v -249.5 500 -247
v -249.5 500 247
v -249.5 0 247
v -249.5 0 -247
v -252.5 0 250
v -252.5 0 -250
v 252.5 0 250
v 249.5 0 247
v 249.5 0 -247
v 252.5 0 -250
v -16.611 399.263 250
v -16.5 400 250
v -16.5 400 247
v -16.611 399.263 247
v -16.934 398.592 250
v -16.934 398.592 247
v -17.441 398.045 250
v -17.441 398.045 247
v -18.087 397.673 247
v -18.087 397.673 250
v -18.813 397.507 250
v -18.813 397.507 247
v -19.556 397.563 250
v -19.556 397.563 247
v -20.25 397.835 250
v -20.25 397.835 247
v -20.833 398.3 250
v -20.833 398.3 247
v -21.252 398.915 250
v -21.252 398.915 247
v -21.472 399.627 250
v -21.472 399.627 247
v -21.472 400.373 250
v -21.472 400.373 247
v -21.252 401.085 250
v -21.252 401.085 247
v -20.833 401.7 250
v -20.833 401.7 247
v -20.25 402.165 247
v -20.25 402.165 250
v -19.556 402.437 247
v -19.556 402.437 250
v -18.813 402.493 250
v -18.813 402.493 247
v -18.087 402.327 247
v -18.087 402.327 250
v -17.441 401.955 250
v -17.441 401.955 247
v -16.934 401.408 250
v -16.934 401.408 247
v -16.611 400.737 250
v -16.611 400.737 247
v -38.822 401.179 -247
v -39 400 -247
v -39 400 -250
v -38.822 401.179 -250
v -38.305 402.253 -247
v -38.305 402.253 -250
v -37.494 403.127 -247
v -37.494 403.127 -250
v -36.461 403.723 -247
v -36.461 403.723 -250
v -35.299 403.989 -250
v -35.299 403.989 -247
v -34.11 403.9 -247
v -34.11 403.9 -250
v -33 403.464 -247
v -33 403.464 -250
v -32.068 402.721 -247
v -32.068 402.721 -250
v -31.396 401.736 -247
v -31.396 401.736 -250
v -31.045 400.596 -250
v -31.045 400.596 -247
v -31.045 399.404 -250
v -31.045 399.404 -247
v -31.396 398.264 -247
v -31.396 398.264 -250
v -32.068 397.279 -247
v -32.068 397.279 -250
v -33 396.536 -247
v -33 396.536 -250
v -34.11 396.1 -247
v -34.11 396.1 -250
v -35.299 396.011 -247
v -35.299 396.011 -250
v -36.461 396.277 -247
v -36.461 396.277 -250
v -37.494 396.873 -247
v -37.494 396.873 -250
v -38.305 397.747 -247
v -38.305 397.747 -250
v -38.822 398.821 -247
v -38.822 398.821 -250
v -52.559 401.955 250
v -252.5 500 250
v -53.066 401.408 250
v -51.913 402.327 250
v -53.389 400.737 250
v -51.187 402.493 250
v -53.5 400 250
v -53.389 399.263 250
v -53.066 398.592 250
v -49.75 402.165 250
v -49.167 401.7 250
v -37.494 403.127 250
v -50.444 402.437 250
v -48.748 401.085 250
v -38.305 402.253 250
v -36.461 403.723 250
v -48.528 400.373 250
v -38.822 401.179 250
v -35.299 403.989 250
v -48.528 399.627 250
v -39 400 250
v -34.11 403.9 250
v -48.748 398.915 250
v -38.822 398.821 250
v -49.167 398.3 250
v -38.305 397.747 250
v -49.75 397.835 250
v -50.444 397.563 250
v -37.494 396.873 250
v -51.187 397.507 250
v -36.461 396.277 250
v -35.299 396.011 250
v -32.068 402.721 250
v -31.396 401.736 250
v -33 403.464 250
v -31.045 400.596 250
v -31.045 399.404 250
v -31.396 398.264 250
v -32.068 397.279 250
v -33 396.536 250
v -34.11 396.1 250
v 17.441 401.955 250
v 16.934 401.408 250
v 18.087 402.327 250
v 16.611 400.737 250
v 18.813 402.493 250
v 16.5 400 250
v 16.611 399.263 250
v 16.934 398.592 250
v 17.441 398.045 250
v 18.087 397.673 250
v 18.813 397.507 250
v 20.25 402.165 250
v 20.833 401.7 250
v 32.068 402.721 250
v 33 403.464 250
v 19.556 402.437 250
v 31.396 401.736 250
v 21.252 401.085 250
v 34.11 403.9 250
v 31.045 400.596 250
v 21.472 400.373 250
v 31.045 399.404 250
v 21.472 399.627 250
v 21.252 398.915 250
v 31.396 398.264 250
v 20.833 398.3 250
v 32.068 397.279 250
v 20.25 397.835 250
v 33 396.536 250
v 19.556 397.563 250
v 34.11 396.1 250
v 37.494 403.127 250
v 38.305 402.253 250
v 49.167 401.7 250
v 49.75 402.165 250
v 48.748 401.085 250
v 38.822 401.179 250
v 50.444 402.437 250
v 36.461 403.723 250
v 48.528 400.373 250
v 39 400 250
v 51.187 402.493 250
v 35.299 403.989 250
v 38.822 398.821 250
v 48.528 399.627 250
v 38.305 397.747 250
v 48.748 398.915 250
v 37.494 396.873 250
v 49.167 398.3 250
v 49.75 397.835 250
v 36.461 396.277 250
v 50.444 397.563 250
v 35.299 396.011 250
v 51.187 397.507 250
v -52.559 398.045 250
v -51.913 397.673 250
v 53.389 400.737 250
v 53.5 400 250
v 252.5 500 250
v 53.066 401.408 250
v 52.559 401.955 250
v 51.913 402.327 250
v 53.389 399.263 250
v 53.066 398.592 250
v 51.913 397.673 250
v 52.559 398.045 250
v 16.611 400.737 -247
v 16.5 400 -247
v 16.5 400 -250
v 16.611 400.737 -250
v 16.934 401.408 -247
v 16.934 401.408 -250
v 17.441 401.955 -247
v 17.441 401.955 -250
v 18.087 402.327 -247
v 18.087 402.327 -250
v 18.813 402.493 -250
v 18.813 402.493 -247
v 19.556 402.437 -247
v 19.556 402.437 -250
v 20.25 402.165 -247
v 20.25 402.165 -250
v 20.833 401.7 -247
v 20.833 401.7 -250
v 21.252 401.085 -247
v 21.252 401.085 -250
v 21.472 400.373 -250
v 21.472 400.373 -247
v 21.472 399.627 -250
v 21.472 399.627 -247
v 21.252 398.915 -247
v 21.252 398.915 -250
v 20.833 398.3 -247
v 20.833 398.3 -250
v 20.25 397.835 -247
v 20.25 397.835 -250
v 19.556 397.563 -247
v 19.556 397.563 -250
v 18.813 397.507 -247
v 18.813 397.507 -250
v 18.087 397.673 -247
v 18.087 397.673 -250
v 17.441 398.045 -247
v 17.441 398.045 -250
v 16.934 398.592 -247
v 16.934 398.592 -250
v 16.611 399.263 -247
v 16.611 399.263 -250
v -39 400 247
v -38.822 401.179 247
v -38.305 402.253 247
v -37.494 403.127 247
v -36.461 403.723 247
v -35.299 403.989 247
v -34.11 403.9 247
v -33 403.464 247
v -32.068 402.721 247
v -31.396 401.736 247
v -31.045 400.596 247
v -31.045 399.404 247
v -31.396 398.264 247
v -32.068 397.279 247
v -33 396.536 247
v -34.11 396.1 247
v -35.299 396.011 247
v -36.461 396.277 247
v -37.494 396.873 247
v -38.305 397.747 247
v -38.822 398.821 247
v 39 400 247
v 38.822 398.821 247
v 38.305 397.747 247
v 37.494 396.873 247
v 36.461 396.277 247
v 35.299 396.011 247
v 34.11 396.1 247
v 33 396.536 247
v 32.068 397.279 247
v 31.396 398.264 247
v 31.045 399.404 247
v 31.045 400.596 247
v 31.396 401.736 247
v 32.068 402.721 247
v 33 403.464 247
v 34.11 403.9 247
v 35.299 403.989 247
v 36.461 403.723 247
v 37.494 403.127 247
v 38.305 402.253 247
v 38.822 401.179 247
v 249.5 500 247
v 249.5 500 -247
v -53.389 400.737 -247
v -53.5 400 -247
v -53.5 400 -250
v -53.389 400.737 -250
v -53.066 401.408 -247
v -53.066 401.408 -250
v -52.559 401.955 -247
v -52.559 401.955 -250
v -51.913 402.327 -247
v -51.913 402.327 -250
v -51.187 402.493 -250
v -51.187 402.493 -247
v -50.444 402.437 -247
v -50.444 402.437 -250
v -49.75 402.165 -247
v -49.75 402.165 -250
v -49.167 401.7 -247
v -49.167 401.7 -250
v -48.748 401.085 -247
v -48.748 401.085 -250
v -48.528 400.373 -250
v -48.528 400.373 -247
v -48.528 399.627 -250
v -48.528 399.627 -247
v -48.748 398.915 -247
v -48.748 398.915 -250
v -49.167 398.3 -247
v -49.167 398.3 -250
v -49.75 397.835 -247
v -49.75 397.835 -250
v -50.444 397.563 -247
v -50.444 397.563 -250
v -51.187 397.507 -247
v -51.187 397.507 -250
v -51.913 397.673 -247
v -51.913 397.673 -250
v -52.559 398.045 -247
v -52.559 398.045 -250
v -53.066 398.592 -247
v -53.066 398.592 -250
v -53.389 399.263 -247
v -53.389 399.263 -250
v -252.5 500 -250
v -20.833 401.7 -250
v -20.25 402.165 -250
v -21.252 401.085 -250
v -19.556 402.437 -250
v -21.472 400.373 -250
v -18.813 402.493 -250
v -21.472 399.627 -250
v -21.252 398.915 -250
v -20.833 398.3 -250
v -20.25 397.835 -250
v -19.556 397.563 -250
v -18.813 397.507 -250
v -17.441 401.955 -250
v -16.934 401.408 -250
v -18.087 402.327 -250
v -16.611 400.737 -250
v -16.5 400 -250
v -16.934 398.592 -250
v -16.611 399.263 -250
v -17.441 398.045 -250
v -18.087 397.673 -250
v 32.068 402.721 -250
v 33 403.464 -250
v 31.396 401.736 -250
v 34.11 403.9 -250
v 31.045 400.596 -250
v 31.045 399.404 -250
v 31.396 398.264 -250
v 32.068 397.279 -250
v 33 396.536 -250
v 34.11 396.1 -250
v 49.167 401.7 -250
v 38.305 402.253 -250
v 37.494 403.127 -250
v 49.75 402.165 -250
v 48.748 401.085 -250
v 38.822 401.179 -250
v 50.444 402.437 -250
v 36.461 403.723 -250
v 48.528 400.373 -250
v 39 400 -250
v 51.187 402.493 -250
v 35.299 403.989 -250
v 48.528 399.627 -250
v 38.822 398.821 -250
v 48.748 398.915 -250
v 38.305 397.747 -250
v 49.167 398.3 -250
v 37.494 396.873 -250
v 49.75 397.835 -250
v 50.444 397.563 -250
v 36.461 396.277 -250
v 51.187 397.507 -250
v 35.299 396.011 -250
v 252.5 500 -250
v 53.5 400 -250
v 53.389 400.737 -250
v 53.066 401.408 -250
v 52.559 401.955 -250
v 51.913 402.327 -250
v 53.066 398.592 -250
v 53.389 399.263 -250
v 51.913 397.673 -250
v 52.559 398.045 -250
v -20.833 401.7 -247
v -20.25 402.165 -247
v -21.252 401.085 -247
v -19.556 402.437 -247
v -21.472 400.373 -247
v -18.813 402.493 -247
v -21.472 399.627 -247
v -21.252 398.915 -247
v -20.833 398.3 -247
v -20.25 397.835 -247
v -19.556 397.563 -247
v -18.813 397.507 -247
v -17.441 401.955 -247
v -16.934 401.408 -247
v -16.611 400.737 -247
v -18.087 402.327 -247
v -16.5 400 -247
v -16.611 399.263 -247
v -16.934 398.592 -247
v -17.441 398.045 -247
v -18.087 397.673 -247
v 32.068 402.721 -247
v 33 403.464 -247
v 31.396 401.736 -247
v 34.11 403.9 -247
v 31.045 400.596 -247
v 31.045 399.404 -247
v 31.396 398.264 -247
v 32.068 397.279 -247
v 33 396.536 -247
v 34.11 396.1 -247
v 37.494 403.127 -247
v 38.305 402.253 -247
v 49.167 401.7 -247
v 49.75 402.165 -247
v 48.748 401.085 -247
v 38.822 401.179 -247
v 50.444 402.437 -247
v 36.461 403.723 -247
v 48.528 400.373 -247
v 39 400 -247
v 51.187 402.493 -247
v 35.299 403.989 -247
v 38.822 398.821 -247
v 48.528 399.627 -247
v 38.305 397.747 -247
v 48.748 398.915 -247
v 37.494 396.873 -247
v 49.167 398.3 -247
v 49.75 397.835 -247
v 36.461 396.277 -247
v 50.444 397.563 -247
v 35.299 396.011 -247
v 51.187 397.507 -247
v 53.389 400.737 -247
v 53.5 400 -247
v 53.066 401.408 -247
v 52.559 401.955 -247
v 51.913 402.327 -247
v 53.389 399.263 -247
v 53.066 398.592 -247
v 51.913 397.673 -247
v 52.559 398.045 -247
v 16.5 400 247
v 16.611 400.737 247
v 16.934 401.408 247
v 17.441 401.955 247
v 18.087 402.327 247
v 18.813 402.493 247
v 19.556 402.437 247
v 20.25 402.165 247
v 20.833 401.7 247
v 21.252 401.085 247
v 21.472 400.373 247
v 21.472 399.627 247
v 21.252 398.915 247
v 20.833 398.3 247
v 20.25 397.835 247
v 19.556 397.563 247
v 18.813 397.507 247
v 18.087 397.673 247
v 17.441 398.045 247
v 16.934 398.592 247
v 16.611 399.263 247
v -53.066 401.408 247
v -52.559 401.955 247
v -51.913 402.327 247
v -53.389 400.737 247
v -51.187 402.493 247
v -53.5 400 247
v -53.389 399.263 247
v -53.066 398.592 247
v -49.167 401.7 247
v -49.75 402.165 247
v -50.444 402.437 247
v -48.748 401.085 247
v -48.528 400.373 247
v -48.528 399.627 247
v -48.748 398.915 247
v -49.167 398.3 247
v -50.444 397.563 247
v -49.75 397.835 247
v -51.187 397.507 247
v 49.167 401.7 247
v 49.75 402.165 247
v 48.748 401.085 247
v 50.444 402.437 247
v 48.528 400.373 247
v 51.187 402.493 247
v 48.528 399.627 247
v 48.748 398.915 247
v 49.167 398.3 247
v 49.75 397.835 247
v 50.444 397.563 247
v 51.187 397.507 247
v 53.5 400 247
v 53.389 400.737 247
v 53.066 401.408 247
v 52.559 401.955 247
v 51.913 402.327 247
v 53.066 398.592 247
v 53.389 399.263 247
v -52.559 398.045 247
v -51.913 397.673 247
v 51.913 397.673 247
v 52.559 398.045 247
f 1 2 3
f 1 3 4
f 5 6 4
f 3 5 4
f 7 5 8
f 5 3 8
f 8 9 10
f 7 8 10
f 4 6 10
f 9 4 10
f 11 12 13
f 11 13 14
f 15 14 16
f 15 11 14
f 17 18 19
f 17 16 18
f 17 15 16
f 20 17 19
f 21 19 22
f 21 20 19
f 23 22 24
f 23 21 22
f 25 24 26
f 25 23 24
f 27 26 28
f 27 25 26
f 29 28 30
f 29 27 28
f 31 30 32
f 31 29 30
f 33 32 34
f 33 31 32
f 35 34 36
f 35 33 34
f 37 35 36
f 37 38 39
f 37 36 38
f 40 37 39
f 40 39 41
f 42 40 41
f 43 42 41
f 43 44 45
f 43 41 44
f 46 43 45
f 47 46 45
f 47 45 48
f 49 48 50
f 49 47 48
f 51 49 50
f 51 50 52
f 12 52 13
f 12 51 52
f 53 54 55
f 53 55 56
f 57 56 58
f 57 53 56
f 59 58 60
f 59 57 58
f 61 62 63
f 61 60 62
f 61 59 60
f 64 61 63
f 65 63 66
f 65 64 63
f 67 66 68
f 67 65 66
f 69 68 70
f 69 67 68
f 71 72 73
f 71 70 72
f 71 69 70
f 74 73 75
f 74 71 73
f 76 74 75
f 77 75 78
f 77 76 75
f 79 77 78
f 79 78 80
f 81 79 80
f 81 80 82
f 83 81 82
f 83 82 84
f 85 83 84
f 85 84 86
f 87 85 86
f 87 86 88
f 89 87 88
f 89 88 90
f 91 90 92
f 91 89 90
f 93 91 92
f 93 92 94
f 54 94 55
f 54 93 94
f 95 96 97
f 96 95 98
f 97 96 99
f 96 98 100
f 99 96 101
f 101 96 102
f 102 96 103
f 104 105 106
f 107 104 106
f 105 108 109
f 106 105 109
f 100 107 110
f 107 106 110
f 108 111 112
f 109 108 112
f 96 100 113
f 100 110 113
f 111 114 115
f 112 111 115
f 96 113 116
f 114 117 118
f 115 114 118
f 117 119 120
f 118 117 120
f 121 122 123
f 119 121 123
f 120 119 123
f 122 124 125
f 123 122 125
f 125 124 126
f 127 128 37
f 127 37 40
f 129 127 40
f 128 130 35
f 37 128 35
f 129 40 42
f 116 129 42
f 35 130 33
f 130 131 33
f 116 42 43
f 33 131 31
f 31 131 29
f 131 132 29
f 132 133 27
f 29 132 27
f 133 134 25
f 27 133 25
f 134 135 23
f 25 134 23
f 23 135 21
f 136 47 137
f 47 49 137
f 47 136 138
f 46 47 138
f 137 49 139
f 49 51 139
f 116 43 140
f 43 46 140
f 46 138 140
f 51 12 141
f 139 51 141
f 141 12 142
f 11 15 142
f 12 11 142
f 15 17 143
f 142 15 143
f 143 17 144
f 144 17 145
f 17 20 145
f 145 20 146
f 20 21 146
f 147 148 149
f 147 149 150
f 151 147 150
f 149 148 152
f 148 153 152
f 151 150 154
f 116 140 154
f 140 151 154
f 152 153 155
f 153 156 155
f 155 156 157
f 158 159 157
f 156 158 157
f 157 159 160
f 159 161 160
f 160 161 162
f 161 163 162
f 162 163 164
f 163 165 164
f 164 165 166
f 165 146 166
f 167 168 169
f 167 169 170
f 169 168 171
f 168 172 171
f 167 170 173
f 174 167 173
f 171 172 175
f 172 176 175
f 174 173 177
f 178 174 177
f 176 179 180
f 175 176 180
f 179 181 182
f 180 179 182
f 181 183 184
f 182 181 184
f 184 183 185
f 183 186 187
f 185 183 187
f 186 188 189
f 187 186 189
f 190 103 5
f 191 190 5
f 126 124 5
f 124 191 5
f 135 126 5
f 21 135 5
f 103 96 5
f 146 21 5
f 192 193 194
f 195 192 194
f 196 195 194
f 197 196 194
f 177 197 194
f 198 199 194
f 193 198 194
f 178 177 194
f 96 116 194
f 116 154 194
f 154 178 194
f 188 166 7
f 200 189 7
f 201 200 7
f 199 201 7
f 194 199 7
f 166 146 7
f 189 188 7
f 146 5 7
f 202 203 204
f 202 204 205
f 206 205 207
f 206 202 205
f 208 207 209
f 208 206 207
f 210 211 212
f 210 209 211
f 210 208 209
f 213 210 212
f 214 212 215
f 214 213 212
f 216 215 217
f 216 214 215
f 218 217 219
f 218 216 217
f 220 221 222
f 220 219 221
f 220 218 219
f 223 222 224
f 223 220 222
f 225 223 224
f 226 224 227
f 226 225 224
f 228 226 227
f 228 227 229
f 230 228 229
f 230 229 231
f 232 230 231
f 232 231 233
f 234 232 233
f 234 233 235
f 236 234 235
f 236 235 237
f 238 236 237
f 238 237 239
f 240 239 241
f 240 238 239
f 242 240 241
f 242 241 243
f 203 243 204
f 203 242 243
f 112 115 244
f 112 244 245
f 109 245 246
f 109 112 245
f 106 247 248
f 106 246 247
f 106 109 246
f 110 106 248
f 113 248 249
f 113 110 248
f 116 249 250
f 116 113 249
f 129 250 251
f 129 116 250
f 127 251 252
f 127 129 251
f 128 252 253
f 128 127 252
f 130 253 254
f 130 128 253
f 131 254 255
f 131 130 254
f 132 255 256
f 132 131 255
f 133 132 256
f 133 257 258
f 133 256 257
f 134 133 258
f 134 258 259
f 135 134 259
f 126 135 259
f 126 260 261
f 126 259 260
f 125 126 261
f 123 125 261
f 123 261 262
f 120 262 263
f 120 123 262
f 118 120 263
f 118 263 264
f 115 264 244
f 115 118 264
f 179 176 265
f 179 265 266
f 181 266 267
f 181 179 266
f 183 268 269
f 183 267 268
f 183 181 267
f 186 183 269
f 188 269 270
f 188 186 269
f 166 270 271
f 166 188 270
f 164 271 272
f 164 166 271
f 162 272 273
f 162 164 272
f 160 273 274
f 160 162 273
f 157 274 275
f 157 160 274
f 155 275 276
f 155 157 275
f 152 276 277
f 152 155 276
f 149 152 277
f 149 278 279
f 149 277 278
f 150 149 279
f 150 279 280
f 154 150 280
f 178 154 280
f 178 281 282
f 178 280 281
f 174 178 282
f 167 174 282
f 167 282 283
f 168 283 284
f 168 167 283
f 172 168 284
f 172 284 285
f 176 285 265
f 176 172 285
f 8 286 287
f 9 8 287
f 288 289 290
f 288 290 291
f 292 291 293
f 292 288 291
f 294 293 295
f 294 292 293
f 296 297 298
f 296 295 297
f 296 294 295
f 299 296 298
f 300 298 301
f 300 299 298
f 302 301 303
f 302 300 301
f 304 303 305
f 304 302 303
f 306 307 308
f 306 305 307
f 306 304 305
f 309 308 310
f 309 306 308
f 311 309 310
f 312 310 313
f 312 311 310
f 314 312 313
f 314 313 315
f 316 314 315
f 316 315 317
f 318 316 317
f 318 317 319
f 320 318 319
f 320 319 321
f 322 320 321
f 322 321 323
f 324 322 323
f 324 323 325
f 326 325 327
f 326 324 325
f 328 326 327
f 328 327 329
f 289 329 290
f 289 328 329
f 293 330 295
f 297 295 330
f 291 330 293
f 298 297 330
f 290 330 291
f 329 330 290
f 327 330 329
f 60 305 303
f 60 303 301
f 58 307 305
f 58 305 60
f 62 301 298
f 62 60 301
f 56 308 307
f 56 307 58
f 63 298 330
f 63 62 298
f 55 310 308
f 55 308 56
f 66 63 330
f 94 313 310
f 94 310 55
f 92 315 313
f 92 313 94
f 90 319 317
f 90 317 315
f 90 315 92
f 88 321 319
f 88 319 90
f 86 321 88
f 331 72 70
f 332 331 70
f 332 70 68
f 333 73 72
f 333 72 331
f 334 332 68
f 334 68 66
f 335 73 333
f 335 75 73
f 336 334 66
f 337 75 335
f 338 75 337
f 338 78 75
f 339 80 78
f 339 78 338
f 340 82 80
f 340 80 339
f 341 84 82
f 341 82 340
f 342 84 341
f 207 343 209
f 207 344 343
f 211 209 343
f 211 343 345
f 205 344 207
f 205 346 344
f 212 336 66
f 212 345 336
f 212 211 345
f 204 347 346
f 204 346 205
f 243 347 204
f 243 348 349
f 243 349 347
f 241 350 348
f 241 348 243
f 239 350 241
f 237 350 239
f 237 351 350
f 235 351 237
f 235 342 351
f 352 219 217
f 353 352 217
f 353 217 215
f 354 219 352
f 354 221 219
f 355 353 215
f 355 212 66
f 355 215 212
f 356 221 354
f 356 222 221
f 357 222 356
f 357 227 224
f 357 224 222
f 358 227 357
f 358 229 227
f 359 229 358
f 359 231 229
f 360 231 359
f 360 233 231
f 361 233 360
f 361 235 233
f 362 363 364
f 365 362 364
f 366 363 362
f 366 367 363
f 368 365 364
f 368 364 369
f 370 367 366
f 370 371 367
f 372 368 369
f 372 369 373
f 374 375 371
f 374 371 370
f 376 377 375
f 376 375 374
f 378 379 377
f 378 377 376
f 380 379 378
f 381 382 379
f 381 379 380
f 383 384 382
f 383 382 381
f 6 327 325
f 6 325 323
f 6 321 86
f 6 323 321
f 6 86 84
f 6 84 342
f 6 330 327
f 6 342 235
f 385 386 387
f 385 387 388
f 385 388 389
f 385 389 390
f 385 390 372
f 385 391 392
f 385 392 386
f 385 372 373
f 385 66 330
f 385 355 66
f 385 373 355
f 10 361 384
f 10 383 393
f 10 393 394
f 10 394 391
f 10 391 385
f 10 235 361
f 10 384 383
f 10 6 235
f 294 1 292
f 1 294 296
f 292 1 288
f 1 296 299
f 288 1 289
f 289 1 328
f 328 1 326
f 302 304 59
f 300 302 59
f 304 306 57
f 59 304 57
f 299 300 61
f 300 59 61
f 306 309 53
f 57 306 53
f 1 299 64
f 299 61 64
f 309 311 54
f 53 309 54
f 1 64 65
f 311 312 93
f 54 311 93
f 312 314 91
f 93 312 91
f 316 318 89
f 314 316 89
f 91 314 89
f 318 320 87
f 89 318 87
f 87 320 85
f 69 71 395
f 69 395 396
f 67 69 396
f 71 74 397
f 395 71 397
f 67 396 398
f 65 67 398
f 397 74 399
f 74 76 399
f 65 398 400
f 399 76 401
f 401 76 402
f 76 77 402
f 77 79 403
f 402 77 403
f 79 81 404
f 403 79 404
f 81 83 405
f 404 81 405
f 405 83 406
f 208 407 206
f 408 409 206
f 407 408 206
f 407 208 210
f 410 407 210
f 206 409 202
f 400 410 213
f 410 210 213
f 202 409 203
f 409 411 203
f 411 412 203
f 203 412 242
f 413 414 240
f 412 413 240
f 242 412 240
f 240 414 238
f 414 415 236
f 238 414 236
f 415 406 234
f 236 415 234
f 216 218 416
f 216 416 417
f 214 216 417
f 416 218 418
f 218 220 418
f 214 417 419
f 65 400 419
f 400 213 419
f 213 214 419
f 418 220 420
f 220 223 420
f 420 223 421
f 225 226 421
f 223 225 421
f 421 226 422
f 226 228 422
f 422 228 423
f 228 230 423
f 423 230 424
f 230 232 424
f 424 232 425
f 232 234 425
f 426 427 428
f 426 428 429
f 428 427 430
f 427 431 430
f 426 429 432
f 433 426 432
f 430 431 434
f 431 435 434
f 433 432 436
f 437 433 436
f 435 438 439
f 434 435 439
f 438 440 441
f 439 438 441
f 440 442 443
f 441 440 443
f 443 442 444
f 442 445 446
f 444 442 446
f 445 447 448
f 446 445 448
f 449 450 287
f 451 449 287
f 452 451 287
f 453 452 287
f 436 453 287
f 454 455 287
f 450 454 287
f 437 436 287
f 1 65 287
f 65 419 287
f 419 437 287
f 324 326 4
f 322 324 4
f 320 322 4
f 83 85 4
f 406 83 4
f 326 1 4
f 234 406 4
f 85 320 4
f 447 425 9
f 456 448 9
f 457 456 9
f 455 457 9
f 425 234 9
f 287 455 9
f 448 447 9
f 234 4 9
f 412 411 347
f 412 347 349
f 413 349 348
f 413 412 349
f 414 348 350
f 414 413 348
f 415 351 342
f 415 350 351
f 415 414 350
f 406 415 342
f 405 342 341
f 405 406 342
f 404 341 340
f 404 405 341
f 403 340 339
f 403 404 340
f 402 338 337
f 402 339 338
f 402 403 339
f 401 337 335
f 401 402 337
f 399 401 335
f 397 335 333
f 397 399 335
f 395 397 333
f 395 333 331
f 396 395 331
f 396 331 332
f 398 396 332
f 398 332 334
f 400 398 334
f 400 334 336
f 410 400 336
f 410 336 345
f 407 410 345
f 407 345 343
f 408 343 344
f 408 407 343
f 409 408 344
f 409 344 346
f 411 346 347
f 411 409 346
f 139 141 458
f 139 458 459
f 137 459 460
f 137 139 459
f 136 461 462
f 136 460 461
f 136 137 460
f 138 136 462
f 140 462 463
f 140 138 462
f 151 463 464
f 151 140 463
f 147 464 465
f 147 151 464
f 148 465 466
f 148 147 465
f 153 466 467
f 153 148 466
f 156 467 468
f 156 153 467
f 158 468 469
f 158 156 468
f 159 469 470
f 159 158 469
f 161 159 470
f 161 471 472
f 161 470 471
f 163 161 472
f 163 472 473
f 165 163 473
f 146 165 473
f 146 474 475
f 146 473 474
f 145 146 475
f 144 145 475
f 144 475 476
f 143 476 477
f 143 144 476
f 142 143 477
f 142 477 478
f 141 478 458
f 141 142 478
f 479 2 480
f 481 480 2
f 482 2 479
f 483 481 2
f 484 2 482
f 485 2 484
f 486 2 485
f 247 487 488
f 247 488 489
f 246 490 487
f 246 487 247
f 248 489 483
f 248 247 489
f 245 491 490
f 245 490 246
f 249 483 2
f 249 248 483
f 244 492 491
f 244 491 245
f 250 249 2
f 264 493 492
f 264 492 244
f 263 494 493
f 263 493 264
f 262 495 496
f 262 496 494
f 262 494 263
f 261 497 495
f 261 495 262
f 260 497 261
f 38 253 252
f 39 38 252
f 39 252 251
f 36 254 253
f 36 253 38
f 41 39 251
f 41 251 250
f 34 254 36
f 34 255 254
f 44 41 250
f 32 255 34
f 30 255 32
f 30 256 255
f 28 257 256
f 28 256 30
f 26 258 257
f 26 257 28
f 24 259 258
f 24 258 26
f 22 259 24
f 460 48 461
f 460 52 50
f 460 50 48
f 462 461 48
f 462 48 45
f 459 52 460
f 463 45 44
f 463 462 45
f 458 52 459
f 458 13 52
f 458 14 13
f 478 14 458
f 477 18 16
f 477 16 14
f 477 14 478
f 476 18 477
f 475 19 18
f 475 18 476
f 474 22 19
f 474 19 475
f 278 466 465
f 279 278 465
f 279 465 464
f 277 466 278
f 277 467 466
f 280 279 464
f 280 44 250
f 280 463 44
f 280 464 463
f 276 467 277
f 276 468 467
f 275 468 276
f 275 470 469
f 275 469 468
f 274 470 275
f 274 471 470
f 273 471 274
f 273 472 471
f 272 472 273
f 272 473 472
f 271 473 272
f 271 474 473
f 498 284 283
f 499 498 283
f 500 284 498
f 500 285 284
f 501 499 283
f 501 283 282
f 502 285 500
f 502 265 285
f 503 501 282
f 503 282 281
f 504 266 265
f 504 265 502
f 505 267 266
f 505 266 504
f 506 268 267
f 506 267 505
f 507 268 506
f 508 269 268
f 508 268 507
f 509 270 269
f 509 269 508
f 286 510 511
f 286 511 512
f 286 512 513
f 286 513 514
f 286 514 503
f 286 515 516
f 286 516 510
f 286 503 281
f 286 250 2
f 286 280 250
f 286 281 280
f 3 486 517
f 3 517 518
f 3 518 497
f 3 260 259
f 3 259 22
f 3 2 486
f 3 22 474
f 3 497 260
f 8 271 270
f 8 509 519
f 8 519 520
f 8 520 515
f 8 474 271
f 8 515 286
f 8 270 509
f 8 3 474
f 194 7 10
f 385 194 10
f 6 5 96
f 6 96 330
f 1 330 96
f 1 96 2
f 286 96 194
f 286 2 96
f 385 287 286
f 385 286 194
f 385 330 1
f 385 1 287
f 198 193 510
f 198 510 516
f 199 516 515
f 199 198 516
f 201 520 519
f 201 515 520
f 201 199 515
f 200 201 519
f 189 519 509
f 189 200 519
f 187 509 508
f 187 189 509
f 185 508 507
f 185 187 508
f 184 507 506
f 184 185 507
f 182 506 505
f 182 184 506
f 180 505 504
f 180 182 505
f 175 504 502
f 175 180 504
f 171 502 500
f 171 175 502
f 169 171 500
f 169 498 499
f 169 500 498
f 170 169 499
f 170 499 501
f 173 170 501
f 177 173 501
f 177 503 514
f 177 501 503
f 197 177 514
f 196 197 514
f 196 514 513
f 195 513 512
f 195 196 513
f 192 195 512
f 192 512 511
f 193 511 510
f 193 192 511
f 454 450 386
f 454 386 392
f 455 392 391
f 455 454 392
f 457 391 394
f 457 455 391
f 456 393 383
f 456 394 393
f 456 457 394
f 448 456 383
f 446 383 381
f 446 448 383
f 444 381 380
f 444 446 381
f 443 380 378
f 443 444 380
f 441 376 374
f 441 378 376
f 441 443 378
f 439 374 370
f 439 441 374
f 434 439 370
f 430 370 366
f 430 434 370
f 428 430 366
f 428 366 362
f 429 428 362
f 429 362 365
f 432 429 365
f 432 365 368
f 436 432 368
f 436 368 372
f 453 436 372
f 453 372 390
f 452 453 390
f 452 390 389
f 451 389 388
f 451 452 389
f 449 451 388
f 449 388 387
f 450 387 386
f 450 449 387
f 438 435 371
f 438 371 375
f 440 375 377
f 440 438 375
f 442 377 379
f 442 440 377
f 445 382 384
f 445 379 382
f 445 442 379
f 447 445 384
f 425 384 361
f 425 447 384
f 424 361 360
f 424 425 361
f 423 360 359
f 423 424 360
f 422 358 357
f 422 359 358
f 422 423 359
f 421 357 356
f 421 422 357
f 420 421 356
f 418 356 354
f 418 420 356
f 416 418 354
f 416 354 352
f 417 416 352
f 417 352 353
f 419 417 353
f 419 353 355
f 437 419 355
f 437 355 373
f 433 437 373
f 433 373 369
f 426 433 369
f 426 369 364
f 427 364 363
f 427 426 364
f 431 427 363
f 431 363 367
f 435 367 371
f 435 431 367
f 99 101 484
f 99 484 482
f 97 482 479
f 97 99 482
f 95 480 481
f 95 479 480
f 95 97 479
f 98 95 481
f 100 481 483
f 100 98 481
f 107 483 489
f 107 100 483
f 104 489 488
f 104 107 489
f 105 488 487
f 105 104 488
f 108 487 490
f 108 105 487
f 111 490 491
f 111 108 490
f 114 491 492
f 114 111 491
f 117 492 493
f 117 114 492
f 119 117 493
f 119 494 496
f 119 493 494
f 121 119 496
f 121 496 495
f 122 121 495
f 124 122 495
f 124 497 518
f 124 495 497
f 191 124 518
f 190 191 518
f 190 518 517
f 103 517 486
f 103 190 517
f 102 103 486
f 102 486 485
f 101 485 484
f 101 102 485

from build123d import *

# Parameters (mm, degrees)
SKETCH1_W               = 505
SKETCH1_H               = 500
SKETCH1_W_2             = 499
SKETCH1_H_2             = 494
BOSS_EXTRUDE1_DEPTH     = 500
CUT_EXTRUDE2_DEPTH      = 751.837032917
CUT_EXTRUDE2_DEPTH_BACK = 751.837032917
SKETCH4_R               = 4
SKETCH4_R_2             = 2.5


with BuildPart() as part:
    # Sketch1 → Boss-Extrude1 (new body)
    with BuildSketch(Plane(origin=(0, 0, 0), x_dir=(1, 0, 0), z_dir=(0, 1, 0))):
        Rectangle(SKETCH1_W, SKETCH1_H)
        Rectangle(SKETCH1_W_2, SKETCH1_H_2, mode=Mode.SUBTRACT)
    extrude(amount=BOSS_EXTRUDE1_DEPTH)

    # Sketch4 → Cut-Extrude2 (cut, two sides: drawn at the far end of the back side and taken through both)
    with BuildSketch(Plane(origin=(0, 0, -250), x_dir=(-1, 0, 0), z_dir=(0, 0, -1)).offset(-CUT_EXTRUDE2_DEPTH_BACK)):
        with Locations((35, 400)):
            Circle(SKETCH4_R)
        with Locations(Location((-35, 400, 0), (0, 0, 180))):
            Circle(SKETCH4_R)
        with Locations((-19, 400)):
            Circle(SKETCH4_R_2)
        with Locations(Location((-51, 400, 0), (0, 0, 180))):
            Circle(SKETCH4_R_2)
        with Locations(Location((19, 400, 0), (0, 0, 180))):
            Circle(SKETCH4_R_2)
        with Locations((51, 400)):
            Circle(SKETCH4_R_2)
    extrude(amount=CUT_EXTRUDE2_DEPTH + CUT_EXTRUDE2_DEPTH_BACK, mode=Mode.SUBTRACT)


solid = part.part
